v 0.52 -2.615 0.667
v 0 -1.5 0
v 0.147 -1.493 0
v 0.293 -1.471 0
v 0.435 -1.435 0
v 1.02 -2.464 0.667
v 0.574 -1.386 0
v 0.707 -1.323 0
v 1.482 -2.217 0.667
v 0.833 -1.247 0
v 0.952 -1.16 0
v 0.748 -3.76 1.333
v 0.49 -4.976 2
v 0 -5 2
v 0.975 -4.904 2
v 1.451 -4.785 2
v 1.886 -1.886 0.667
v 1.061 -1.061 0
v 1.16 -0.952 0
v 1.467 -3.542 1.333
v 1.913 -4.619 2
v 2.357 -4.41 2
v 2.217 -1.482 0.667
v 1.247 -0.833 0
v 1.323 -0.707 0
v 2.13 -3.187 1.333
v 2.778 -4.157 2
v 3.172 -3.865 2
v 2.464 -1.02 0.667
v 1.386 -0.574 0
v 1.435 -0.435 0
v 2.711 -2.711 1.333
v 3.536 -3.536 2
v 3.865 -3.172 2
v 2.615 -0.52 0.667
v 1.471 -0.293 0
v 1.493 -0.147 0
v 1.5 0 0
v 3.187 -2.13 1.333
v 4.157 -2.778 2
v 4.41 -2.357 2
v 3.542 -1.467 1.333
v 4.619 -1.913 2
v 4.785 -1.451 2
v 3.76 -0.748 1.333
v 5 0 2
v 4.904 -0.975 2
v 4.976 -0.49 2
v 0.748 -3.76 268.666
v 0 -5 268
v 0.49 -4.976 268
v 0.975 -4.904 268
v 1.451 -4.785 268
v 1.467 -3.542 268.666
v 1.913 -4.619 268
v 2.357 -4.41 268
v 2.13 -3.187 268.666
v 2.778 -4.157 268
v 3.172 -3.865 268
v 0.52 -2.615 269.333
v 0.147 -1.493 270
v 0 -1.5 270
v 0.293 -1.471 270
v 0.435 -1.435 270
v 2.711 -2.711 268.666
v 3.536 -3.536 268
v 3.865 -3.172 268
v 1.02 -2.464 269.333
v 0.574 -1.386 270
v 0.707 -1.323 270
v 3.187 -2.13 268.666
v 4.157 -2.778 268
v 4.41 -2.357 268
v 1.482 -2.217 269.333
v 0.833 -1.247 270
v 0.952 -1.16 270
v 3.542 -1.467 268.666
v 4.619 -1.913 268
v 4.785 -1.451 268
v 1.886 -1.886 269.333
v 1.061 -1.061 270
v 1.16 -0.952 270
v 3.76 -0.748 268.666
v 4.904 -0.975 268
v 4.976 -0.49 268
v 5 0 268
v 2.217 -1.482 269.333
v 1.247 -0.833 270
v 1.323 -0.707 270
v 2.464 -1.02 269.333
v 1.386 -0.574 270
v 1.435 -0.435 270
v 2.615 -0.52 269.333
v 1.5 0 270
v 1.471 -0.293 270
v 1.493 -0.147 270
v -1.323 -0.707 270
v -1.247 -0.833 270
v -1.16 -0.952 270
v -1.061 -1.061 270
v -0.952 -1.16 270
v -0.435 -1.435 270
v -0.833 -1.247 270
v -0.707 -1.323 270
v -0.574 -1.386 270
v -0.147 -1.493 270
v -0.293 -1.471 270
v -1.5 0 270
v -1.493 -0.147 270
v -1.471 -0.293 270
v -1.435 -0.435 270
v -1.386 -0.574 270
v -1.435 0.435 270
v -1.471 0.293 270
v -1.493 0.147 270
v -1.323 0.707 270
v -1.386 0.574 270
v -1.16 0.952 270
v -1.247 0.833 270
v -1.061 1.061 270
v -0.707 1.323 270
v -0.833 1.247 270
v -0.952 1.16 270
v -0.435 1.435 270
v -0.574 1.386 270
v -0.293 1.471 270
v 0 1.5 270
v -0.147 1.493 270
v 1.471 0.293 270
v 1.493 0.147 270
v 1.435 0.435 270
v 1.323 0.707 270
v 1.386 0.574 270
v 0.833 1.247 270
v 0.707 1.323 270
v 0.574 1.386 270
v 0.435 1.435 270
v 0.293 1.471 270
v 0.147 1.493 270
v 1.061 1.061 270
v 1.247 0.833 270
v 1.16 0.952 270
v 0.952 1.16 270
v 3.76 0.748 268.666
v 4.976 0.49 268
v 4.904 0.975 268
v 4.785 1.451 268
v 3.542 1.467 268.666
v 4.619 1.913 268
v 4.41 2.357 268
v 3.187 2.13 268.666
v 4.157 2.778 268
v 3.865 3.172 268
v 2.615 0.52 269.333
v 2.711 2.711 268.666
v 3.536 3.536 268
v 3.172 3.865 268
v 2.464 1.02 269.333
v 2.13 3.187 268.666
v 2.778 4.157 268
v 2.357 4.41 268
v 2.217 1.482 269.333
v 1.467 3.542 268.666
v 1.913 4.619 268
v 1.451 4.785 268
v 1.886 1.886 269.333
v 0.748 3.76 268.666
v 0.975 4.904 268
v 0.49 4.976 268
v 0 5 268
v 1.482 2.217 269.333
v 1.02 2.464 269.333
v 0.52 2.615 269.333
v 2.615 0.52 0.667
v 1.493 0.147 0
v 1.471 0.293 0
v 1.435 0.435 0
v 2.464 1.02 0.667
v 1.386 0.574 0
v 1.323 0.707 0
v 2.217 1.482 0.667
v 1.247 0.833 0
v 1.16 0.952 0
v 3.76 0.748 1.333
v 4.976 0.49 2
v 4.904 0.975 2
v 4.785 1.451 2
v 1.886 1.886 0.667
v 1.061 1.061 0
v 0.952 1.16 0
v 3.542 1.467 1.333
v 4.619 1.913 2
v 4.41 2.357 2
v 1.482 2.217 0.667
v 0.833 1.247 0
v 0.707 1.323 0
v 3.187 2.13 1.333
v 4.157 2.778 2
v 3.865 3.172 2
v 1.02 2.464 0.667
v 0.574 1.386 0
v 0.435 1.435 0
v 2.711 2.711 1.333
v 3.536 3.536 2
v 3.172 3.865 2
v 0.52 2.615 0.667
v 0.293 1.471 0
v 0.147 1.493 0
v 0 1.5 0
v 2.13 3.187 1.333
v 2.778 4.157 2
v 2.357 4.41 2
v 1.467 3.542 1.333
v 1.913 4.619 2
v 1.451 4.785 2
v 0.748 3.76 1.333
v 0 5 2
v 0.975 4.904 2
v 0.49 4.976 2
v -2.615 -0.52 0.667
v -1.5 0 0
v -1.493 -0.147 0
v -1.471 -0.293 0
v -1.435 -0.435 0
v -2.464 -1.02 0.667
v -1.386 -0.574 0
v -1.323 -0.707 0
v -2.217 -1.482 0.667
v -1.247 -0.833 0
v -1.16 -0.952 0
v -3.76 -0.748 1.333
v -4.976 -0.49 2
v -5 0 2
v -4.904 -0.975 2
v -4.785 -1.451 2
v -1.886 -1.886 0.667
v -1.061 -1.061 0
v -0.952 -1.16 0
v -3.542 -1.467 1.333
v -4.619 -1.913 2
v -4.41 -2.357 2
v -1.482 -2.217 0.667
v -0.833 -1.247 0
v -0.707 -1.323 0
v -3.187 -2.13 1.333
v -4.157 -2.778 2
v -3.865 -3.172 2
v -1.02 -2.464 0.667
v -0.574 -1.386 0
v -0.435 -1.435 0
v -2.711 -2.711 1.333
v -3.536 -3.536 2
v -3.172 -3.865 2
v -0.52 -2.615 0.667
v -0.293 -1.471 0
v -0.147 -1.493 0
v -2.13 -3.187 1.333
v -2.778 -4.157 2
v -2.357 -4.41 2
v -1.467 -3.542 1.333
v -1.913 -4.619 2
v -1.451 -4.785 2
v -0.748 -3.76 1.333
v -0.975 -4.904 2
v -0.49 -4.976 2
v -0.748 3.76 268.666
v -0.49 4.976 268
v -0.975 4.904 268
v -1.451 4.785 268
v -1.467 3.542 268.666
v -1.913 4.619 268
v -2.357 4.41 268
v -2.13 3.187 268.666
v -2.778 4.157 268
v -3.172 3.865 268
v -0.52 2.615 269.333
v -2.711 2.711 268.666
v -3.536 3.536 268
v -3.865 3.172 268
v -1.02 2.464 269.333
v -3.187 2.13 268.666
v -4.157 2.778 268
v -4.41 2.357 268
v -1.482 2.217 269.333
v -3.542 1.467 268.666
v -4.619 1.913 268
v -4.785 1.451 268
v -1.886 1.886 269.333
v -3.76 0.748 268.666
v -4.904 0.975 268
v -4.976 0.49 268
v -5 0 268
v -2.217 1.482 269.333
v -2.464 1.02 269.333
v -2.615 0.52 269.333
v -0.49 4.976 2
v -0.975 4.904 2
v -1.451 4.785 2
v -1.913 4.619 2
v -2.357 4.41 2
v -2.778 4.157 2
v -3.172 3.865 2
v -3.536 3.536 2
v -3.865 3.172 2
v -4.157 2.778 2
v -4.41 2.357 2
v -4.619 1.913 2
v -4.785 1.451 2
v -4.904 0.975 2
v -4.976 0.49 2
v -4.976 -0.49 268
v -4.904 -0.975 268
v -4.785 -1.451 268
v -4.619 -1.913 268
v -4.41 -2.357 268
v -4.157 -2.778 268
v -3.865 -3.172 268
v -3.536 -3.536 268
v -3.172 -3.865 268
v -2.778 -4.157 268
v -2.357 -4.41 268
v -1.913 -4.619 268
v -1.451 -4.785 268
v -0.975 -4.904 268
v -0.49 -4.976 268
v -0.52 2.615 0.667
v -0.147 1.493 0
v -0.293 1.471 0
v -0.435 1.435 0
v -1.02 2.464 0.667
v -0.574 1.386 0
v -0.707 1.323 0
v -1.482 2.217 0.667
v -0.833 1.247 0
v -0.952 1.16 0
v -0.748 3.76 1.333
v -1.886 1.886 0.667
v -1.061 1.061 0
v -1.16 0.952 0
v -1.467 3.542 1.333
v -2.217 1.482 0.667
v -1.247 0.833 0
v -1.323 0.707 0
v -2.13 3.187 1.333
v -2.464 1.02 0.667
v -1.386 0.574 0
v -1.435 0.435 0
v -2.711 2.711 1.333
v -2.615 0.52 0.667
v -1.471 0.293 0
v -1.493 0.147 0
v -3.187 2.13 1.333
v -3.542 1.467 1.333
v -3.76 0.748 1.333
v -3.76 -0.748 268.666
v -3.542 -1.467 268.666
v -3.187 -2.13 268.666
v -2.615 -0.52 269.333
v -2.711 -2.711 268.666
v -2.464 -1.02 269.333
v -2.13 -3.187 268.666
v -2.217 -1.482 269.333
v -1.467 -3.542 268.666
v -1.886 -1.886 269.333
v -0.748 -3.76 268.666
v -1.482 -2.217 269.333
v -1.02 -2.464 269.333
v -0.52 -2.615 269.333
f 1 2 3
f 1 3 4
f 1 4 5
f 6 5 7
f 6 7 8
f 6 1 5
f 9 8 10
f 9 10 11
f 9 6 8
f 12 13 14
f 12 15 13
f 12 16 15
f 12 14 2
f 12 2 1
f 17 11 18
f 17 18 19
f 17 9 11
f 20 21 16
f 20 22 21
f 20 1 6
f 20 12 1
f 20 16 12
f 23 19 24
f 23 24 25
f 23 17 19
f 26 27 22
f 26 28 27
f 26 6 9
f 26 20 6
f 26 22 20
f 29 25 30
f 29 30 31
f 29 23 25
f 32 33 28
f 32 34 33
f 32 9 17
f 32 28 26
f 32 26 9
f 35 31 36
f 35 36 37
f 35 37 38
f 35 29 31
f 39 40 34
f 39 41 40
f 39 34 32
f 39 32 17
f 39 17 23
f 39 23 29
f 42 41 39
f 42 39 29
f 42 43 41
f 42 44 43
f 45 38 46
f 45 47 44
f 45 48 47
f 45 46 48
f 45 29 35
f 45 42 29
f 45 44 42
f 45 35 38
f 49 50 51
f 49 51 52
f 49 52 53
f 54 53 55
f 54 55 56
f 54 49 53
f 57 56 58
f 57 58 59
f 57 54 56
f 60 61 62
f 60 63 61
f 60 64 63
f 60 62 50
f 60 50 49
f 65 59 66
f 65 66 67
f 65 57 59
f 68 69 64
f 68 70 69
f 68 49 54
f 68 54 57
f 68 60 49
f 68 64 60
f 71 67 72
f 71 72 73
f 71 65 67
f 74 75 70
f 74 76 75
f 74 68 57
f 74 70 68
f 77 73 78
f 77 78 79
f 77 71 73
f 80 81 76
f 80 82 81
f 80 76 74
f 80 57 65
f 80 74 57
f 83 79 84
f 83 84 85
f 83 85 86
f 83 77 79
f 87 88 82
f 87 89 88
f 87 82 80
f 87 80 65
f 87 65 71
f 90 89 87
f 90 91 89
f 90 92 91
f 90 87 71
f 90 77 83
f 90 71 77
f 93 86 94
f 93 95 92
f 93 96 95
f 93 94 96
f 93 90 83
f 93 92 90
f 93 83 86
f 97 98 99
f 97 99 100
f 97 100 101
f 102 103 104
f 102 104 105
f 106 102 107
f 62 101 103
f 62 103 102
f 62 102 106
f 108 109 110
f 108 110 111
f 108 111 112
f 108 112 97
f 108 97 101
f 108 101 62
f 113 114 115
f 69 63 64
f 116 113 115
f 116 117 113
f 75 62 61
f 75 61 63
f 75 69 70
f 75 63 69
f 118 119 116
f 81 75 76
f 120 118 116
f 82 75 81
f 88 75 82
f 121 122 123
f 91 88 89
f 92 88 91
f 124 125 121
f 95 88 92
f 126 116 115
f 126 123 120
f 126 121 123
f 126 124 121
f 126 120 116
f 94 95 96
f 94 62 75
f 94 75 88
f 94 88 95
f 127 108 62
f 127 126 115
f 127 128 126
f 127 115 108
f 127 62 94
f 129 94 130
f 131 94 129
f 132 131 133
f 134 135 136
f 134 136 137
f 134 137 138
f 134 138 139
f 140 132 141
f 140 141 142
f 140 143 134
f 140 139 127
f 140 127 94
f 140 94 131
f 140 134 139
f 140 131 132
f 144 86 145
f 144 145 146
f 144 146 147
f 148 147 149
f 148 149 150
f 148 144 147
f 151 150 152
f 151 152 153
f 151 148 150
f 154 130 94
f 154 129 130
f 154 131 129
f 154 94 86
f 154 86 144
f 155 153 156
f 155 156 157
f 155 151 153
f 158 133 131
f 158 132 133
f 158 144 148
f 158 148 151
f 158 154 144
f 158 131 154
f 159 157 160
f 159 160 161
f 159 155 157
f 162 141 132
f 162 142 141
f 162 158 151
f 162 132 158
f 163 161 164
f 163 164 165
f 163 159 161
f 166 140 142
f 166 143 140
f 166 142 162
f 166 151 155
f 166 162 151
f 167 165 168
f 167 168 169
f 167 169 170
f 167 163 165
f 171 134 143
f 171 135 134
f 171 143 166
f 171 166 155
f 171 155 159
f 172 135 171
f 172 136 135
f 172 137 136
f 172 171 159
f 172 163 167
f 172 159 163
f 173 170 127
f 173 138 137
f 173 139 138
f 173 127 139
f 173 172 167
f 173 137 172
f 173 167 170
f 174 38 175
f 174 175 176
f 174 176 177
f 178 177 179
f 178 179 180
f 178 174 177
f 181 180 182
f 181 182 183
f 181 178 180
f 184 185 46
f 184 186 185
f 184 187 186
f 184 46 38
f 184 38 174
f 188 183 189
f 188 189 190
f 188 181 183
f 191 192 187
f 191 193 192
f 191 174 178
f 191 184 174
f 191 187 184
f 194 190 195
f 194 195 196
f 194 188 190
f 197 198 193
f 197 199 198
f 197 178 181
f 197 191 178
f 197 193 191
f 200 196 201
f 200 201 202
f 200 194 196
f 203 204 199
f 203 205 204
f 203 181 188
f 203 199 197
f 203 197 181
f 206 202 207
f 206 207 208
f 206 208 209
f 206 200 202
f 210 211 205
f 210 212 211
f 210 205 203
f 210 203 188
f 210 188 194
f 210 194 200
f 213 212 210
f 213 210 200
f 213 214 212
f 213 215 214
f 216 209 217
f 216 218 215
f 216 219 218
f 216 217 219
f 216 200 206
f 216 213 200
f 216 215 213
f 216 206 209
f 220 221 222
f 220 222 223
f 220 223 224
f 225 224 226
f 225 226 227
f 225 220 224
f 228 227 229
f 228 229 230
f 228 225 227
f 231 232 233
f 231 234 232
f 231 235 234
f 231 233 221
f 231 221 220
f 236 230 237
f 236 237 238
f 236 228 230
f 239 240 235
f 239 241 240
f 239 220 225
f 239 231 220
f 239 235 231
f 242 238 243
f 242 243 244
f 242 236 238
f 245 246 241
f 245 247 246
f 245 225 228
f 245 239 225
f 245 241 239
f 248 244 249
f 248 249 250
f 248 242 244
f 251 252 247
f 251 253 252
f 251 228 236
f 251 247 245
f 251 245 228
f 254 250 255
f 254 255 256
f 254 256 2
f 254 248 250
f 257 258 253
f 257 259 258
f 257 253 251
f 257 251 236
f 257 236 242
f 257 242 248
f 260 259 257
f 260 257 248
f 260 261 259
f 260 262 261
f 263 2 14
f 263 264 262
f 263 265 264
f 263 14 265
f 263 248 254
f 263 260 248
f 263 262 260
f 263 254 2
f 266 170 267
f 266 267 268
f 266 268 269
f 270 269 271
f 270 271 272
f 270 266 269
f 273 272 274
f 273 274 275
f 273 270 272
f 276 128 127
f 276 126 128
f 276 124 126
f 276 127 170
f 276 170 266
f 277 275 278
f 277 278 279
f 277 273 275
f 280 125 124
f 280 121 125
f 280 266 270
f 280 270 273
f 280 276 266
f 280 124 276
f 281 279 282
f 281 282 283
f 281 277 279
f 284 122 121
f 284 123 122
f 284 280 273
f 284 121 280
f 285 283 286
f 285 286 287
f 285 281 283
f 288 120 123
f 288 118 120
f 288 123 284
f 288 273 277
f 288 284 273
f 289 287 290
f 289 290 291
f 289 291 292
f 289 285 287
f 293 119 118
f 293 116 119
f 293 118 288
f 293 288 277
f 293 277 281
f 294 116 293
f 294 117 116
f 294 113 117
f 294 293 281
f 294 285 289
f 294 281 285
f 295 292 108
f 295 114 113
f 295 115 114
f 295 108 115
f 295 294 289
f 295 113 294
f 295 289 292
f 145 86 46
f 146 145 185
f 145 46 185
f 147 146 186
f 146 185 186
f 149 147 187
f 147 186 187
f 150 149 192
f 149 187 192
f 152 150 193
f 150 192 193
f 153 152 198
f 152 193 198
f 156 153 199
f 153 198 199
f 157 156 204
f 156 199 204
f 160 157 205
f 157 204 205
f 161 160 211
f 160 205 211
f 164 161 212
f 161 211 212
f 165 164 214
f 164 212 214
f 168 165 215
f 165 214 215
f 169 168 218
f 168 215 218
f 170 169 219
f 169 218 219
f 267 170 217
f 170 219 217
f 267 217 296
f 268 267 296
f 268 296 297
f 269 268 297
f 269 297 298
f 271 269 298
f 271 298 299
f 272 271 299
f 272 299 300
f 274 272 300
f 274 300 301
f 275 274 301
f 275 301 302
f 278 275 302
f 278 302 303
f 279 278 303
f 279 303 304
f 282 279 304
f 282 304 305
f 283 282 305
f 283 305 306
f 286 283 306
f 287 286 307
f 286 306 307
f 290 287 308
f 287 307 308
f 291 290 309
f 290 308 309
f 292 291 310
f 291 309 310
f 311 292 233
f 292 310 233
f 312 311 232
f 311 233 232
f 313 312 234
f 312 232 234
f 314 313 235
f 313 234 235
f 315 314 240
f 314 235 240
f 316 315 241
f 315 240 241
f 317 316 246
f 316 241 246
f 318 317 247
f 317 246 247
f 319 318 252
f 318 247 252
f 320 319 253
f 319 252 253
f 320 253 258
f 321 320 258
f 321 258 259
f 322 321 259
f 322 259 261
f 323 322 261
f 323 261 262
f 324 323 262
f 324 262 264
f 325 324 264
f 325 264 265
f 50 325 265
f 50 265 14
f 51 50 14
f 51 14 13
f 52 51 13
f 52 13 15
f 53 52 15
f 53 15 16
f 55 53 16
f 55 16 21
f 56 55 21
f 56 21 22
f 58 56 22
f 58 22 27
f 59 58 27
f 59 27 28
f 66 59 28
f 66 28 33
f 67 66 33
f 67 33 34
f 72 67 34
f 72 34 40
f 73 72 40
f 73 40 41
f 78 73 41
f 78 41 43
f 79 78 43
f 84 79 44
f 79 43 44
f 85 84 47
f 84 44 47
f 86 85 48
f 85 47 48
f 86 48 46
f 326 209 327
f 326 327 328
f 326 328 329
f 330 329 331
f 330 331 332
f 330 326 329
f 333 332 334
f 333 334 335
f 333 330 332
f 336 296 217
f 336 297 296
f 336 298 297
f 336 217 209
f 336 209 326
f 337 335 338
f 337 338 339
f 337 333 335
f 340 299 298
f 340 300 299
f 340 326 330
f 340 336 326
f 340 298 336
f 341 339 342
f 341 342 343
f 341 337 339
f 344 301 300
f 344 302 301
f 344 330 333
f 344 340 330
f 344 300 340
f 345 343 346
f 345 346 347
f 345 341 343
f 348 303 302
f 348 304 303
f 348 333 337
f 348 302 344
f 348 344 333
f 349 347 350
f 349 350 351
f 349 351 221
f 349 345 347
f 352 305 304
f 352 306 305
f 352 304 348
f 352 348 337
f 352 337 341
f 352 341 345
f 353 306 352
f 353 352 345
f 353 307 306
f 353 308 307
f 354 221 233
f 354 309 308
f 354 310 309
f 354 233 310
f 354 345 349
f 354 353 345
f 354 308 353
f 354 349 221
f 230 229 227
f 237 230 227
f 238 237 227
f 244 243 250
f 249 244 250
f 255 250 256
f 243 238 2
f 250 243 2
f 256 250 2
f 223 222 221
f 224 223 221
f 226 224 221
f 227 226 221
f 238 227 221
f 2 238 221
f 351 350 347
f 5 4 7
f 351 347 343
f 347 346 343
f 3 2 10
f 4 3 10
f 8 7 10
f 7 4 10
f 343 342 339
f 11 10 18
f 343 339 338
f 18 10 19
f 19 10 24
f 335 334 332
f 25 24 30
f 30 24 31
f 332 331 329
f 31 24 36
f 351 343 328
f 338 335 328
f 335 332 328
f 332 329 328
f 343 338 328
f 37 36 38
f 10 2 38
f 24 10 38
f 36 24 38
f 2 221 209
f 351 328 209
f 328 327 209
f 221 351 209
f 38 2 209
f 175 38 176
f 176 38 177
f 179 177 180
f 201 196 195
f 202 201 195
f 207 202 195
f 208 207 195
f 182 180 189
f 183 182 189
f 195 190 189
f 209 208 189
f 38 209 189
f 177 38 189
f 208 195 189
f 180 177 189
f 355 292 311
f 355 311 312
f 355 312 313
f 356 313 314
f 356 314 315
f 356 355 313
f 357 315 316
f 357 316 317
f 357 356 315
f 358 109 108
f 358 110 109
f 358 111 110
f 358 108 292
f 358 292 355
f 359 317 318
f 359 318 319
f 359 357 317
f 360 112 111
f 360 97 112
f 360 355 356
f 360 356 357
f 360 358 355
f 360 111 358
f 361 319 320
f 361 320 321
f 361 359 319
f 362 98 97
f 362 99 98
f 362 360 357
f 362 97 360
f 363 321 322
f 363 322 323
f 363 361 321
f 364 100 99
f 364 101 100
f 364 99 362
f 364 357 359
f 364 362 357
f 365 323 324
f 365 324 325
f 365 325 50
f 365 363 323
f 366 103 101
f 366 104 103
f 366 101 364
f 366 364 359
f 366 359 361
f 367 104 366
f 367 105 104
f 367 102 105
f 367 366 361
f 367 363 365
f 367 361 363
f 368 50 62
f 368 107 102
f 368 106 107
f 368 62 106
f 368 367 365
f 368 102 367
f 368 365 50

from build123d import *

# Parameters (mm, degrees)
CROQUIS1_R              = 5
SALIENTE_EXTRUIR1_DEPTH = 270


with BuildPart() as part:
    # Croquis1 → Saliente-Extruir1 (new body)
    with BuildSketch(Plane.XY):
        Circle(CROQUIS1_R)
    extrude(amount=SALIENTE_EXTRUIR1_DEPTH)

    # Cortar-Barrer1: sweep along a curve in space
    with BuildLine() as cortar_barrer1_path:
        ThreePointArc((5, 0, 270), (3.535533906, 3.535533906, 270), (0, 5, 270))
        ThreePointArc((0, 5, 270), (-3.535533906, 3.535533906, 270), (-5, 0, 270))
        ThreePointArc((-5, 0, 270), (-3.535533906, -3.535533906, 270), (0, -5, 270))
        ThreePointArc((0, -5, 270), (3.535533906, -3.535533906, 270), (5, 0, 270))
    # Croquis3 → Cortar-Barrer1 (sweep, cut)
    with BuildSketch(Plane(origin=(0, 0, 0), x_dir=(1, 0, 0), z_dir=(0, 1, 0))):
        Polygon((1.5, -270), (5, -267.999621553), (5, -270), align=None)
    sweep(path=cortar_barrer1_path.line, mode=Mode.SUBTRACT)

    # Cortar-Barrer2: sweep along a curve in space
    with BuildLine() as cortar_barrer2_path:
        ThreePointArc((5, 0, 0), (3.535533906, 3.535533906, 0), (0, 5, 0))
        ThreePointArc((0, 5, 0), (-3.535533906, 3.535533906, 0), (-5, 0, 0))
        ThreePointArc((-5, 0, 0), (-3.535533906, -3.535533906, 0), (0, -5, 0))
        ThreePointArc((0, -5, 0), (3.535533906, -3.535533906, 0), (5, 0, 0))
    # Croquis4 → Cortar-Barrer2 (sweep, cut)
    with BuildSketch(Plane(origin=(0, 0, 0), x_dir=(1, 0, 0), z_dir=(0, 1, 0))):
        Polygon((5, 0), (5, -2), (1.5, 0), align=None)
    sweep(path=cortar_barrer2_path.line, mode=Mode.SUBTRACT)


solid = part.part
